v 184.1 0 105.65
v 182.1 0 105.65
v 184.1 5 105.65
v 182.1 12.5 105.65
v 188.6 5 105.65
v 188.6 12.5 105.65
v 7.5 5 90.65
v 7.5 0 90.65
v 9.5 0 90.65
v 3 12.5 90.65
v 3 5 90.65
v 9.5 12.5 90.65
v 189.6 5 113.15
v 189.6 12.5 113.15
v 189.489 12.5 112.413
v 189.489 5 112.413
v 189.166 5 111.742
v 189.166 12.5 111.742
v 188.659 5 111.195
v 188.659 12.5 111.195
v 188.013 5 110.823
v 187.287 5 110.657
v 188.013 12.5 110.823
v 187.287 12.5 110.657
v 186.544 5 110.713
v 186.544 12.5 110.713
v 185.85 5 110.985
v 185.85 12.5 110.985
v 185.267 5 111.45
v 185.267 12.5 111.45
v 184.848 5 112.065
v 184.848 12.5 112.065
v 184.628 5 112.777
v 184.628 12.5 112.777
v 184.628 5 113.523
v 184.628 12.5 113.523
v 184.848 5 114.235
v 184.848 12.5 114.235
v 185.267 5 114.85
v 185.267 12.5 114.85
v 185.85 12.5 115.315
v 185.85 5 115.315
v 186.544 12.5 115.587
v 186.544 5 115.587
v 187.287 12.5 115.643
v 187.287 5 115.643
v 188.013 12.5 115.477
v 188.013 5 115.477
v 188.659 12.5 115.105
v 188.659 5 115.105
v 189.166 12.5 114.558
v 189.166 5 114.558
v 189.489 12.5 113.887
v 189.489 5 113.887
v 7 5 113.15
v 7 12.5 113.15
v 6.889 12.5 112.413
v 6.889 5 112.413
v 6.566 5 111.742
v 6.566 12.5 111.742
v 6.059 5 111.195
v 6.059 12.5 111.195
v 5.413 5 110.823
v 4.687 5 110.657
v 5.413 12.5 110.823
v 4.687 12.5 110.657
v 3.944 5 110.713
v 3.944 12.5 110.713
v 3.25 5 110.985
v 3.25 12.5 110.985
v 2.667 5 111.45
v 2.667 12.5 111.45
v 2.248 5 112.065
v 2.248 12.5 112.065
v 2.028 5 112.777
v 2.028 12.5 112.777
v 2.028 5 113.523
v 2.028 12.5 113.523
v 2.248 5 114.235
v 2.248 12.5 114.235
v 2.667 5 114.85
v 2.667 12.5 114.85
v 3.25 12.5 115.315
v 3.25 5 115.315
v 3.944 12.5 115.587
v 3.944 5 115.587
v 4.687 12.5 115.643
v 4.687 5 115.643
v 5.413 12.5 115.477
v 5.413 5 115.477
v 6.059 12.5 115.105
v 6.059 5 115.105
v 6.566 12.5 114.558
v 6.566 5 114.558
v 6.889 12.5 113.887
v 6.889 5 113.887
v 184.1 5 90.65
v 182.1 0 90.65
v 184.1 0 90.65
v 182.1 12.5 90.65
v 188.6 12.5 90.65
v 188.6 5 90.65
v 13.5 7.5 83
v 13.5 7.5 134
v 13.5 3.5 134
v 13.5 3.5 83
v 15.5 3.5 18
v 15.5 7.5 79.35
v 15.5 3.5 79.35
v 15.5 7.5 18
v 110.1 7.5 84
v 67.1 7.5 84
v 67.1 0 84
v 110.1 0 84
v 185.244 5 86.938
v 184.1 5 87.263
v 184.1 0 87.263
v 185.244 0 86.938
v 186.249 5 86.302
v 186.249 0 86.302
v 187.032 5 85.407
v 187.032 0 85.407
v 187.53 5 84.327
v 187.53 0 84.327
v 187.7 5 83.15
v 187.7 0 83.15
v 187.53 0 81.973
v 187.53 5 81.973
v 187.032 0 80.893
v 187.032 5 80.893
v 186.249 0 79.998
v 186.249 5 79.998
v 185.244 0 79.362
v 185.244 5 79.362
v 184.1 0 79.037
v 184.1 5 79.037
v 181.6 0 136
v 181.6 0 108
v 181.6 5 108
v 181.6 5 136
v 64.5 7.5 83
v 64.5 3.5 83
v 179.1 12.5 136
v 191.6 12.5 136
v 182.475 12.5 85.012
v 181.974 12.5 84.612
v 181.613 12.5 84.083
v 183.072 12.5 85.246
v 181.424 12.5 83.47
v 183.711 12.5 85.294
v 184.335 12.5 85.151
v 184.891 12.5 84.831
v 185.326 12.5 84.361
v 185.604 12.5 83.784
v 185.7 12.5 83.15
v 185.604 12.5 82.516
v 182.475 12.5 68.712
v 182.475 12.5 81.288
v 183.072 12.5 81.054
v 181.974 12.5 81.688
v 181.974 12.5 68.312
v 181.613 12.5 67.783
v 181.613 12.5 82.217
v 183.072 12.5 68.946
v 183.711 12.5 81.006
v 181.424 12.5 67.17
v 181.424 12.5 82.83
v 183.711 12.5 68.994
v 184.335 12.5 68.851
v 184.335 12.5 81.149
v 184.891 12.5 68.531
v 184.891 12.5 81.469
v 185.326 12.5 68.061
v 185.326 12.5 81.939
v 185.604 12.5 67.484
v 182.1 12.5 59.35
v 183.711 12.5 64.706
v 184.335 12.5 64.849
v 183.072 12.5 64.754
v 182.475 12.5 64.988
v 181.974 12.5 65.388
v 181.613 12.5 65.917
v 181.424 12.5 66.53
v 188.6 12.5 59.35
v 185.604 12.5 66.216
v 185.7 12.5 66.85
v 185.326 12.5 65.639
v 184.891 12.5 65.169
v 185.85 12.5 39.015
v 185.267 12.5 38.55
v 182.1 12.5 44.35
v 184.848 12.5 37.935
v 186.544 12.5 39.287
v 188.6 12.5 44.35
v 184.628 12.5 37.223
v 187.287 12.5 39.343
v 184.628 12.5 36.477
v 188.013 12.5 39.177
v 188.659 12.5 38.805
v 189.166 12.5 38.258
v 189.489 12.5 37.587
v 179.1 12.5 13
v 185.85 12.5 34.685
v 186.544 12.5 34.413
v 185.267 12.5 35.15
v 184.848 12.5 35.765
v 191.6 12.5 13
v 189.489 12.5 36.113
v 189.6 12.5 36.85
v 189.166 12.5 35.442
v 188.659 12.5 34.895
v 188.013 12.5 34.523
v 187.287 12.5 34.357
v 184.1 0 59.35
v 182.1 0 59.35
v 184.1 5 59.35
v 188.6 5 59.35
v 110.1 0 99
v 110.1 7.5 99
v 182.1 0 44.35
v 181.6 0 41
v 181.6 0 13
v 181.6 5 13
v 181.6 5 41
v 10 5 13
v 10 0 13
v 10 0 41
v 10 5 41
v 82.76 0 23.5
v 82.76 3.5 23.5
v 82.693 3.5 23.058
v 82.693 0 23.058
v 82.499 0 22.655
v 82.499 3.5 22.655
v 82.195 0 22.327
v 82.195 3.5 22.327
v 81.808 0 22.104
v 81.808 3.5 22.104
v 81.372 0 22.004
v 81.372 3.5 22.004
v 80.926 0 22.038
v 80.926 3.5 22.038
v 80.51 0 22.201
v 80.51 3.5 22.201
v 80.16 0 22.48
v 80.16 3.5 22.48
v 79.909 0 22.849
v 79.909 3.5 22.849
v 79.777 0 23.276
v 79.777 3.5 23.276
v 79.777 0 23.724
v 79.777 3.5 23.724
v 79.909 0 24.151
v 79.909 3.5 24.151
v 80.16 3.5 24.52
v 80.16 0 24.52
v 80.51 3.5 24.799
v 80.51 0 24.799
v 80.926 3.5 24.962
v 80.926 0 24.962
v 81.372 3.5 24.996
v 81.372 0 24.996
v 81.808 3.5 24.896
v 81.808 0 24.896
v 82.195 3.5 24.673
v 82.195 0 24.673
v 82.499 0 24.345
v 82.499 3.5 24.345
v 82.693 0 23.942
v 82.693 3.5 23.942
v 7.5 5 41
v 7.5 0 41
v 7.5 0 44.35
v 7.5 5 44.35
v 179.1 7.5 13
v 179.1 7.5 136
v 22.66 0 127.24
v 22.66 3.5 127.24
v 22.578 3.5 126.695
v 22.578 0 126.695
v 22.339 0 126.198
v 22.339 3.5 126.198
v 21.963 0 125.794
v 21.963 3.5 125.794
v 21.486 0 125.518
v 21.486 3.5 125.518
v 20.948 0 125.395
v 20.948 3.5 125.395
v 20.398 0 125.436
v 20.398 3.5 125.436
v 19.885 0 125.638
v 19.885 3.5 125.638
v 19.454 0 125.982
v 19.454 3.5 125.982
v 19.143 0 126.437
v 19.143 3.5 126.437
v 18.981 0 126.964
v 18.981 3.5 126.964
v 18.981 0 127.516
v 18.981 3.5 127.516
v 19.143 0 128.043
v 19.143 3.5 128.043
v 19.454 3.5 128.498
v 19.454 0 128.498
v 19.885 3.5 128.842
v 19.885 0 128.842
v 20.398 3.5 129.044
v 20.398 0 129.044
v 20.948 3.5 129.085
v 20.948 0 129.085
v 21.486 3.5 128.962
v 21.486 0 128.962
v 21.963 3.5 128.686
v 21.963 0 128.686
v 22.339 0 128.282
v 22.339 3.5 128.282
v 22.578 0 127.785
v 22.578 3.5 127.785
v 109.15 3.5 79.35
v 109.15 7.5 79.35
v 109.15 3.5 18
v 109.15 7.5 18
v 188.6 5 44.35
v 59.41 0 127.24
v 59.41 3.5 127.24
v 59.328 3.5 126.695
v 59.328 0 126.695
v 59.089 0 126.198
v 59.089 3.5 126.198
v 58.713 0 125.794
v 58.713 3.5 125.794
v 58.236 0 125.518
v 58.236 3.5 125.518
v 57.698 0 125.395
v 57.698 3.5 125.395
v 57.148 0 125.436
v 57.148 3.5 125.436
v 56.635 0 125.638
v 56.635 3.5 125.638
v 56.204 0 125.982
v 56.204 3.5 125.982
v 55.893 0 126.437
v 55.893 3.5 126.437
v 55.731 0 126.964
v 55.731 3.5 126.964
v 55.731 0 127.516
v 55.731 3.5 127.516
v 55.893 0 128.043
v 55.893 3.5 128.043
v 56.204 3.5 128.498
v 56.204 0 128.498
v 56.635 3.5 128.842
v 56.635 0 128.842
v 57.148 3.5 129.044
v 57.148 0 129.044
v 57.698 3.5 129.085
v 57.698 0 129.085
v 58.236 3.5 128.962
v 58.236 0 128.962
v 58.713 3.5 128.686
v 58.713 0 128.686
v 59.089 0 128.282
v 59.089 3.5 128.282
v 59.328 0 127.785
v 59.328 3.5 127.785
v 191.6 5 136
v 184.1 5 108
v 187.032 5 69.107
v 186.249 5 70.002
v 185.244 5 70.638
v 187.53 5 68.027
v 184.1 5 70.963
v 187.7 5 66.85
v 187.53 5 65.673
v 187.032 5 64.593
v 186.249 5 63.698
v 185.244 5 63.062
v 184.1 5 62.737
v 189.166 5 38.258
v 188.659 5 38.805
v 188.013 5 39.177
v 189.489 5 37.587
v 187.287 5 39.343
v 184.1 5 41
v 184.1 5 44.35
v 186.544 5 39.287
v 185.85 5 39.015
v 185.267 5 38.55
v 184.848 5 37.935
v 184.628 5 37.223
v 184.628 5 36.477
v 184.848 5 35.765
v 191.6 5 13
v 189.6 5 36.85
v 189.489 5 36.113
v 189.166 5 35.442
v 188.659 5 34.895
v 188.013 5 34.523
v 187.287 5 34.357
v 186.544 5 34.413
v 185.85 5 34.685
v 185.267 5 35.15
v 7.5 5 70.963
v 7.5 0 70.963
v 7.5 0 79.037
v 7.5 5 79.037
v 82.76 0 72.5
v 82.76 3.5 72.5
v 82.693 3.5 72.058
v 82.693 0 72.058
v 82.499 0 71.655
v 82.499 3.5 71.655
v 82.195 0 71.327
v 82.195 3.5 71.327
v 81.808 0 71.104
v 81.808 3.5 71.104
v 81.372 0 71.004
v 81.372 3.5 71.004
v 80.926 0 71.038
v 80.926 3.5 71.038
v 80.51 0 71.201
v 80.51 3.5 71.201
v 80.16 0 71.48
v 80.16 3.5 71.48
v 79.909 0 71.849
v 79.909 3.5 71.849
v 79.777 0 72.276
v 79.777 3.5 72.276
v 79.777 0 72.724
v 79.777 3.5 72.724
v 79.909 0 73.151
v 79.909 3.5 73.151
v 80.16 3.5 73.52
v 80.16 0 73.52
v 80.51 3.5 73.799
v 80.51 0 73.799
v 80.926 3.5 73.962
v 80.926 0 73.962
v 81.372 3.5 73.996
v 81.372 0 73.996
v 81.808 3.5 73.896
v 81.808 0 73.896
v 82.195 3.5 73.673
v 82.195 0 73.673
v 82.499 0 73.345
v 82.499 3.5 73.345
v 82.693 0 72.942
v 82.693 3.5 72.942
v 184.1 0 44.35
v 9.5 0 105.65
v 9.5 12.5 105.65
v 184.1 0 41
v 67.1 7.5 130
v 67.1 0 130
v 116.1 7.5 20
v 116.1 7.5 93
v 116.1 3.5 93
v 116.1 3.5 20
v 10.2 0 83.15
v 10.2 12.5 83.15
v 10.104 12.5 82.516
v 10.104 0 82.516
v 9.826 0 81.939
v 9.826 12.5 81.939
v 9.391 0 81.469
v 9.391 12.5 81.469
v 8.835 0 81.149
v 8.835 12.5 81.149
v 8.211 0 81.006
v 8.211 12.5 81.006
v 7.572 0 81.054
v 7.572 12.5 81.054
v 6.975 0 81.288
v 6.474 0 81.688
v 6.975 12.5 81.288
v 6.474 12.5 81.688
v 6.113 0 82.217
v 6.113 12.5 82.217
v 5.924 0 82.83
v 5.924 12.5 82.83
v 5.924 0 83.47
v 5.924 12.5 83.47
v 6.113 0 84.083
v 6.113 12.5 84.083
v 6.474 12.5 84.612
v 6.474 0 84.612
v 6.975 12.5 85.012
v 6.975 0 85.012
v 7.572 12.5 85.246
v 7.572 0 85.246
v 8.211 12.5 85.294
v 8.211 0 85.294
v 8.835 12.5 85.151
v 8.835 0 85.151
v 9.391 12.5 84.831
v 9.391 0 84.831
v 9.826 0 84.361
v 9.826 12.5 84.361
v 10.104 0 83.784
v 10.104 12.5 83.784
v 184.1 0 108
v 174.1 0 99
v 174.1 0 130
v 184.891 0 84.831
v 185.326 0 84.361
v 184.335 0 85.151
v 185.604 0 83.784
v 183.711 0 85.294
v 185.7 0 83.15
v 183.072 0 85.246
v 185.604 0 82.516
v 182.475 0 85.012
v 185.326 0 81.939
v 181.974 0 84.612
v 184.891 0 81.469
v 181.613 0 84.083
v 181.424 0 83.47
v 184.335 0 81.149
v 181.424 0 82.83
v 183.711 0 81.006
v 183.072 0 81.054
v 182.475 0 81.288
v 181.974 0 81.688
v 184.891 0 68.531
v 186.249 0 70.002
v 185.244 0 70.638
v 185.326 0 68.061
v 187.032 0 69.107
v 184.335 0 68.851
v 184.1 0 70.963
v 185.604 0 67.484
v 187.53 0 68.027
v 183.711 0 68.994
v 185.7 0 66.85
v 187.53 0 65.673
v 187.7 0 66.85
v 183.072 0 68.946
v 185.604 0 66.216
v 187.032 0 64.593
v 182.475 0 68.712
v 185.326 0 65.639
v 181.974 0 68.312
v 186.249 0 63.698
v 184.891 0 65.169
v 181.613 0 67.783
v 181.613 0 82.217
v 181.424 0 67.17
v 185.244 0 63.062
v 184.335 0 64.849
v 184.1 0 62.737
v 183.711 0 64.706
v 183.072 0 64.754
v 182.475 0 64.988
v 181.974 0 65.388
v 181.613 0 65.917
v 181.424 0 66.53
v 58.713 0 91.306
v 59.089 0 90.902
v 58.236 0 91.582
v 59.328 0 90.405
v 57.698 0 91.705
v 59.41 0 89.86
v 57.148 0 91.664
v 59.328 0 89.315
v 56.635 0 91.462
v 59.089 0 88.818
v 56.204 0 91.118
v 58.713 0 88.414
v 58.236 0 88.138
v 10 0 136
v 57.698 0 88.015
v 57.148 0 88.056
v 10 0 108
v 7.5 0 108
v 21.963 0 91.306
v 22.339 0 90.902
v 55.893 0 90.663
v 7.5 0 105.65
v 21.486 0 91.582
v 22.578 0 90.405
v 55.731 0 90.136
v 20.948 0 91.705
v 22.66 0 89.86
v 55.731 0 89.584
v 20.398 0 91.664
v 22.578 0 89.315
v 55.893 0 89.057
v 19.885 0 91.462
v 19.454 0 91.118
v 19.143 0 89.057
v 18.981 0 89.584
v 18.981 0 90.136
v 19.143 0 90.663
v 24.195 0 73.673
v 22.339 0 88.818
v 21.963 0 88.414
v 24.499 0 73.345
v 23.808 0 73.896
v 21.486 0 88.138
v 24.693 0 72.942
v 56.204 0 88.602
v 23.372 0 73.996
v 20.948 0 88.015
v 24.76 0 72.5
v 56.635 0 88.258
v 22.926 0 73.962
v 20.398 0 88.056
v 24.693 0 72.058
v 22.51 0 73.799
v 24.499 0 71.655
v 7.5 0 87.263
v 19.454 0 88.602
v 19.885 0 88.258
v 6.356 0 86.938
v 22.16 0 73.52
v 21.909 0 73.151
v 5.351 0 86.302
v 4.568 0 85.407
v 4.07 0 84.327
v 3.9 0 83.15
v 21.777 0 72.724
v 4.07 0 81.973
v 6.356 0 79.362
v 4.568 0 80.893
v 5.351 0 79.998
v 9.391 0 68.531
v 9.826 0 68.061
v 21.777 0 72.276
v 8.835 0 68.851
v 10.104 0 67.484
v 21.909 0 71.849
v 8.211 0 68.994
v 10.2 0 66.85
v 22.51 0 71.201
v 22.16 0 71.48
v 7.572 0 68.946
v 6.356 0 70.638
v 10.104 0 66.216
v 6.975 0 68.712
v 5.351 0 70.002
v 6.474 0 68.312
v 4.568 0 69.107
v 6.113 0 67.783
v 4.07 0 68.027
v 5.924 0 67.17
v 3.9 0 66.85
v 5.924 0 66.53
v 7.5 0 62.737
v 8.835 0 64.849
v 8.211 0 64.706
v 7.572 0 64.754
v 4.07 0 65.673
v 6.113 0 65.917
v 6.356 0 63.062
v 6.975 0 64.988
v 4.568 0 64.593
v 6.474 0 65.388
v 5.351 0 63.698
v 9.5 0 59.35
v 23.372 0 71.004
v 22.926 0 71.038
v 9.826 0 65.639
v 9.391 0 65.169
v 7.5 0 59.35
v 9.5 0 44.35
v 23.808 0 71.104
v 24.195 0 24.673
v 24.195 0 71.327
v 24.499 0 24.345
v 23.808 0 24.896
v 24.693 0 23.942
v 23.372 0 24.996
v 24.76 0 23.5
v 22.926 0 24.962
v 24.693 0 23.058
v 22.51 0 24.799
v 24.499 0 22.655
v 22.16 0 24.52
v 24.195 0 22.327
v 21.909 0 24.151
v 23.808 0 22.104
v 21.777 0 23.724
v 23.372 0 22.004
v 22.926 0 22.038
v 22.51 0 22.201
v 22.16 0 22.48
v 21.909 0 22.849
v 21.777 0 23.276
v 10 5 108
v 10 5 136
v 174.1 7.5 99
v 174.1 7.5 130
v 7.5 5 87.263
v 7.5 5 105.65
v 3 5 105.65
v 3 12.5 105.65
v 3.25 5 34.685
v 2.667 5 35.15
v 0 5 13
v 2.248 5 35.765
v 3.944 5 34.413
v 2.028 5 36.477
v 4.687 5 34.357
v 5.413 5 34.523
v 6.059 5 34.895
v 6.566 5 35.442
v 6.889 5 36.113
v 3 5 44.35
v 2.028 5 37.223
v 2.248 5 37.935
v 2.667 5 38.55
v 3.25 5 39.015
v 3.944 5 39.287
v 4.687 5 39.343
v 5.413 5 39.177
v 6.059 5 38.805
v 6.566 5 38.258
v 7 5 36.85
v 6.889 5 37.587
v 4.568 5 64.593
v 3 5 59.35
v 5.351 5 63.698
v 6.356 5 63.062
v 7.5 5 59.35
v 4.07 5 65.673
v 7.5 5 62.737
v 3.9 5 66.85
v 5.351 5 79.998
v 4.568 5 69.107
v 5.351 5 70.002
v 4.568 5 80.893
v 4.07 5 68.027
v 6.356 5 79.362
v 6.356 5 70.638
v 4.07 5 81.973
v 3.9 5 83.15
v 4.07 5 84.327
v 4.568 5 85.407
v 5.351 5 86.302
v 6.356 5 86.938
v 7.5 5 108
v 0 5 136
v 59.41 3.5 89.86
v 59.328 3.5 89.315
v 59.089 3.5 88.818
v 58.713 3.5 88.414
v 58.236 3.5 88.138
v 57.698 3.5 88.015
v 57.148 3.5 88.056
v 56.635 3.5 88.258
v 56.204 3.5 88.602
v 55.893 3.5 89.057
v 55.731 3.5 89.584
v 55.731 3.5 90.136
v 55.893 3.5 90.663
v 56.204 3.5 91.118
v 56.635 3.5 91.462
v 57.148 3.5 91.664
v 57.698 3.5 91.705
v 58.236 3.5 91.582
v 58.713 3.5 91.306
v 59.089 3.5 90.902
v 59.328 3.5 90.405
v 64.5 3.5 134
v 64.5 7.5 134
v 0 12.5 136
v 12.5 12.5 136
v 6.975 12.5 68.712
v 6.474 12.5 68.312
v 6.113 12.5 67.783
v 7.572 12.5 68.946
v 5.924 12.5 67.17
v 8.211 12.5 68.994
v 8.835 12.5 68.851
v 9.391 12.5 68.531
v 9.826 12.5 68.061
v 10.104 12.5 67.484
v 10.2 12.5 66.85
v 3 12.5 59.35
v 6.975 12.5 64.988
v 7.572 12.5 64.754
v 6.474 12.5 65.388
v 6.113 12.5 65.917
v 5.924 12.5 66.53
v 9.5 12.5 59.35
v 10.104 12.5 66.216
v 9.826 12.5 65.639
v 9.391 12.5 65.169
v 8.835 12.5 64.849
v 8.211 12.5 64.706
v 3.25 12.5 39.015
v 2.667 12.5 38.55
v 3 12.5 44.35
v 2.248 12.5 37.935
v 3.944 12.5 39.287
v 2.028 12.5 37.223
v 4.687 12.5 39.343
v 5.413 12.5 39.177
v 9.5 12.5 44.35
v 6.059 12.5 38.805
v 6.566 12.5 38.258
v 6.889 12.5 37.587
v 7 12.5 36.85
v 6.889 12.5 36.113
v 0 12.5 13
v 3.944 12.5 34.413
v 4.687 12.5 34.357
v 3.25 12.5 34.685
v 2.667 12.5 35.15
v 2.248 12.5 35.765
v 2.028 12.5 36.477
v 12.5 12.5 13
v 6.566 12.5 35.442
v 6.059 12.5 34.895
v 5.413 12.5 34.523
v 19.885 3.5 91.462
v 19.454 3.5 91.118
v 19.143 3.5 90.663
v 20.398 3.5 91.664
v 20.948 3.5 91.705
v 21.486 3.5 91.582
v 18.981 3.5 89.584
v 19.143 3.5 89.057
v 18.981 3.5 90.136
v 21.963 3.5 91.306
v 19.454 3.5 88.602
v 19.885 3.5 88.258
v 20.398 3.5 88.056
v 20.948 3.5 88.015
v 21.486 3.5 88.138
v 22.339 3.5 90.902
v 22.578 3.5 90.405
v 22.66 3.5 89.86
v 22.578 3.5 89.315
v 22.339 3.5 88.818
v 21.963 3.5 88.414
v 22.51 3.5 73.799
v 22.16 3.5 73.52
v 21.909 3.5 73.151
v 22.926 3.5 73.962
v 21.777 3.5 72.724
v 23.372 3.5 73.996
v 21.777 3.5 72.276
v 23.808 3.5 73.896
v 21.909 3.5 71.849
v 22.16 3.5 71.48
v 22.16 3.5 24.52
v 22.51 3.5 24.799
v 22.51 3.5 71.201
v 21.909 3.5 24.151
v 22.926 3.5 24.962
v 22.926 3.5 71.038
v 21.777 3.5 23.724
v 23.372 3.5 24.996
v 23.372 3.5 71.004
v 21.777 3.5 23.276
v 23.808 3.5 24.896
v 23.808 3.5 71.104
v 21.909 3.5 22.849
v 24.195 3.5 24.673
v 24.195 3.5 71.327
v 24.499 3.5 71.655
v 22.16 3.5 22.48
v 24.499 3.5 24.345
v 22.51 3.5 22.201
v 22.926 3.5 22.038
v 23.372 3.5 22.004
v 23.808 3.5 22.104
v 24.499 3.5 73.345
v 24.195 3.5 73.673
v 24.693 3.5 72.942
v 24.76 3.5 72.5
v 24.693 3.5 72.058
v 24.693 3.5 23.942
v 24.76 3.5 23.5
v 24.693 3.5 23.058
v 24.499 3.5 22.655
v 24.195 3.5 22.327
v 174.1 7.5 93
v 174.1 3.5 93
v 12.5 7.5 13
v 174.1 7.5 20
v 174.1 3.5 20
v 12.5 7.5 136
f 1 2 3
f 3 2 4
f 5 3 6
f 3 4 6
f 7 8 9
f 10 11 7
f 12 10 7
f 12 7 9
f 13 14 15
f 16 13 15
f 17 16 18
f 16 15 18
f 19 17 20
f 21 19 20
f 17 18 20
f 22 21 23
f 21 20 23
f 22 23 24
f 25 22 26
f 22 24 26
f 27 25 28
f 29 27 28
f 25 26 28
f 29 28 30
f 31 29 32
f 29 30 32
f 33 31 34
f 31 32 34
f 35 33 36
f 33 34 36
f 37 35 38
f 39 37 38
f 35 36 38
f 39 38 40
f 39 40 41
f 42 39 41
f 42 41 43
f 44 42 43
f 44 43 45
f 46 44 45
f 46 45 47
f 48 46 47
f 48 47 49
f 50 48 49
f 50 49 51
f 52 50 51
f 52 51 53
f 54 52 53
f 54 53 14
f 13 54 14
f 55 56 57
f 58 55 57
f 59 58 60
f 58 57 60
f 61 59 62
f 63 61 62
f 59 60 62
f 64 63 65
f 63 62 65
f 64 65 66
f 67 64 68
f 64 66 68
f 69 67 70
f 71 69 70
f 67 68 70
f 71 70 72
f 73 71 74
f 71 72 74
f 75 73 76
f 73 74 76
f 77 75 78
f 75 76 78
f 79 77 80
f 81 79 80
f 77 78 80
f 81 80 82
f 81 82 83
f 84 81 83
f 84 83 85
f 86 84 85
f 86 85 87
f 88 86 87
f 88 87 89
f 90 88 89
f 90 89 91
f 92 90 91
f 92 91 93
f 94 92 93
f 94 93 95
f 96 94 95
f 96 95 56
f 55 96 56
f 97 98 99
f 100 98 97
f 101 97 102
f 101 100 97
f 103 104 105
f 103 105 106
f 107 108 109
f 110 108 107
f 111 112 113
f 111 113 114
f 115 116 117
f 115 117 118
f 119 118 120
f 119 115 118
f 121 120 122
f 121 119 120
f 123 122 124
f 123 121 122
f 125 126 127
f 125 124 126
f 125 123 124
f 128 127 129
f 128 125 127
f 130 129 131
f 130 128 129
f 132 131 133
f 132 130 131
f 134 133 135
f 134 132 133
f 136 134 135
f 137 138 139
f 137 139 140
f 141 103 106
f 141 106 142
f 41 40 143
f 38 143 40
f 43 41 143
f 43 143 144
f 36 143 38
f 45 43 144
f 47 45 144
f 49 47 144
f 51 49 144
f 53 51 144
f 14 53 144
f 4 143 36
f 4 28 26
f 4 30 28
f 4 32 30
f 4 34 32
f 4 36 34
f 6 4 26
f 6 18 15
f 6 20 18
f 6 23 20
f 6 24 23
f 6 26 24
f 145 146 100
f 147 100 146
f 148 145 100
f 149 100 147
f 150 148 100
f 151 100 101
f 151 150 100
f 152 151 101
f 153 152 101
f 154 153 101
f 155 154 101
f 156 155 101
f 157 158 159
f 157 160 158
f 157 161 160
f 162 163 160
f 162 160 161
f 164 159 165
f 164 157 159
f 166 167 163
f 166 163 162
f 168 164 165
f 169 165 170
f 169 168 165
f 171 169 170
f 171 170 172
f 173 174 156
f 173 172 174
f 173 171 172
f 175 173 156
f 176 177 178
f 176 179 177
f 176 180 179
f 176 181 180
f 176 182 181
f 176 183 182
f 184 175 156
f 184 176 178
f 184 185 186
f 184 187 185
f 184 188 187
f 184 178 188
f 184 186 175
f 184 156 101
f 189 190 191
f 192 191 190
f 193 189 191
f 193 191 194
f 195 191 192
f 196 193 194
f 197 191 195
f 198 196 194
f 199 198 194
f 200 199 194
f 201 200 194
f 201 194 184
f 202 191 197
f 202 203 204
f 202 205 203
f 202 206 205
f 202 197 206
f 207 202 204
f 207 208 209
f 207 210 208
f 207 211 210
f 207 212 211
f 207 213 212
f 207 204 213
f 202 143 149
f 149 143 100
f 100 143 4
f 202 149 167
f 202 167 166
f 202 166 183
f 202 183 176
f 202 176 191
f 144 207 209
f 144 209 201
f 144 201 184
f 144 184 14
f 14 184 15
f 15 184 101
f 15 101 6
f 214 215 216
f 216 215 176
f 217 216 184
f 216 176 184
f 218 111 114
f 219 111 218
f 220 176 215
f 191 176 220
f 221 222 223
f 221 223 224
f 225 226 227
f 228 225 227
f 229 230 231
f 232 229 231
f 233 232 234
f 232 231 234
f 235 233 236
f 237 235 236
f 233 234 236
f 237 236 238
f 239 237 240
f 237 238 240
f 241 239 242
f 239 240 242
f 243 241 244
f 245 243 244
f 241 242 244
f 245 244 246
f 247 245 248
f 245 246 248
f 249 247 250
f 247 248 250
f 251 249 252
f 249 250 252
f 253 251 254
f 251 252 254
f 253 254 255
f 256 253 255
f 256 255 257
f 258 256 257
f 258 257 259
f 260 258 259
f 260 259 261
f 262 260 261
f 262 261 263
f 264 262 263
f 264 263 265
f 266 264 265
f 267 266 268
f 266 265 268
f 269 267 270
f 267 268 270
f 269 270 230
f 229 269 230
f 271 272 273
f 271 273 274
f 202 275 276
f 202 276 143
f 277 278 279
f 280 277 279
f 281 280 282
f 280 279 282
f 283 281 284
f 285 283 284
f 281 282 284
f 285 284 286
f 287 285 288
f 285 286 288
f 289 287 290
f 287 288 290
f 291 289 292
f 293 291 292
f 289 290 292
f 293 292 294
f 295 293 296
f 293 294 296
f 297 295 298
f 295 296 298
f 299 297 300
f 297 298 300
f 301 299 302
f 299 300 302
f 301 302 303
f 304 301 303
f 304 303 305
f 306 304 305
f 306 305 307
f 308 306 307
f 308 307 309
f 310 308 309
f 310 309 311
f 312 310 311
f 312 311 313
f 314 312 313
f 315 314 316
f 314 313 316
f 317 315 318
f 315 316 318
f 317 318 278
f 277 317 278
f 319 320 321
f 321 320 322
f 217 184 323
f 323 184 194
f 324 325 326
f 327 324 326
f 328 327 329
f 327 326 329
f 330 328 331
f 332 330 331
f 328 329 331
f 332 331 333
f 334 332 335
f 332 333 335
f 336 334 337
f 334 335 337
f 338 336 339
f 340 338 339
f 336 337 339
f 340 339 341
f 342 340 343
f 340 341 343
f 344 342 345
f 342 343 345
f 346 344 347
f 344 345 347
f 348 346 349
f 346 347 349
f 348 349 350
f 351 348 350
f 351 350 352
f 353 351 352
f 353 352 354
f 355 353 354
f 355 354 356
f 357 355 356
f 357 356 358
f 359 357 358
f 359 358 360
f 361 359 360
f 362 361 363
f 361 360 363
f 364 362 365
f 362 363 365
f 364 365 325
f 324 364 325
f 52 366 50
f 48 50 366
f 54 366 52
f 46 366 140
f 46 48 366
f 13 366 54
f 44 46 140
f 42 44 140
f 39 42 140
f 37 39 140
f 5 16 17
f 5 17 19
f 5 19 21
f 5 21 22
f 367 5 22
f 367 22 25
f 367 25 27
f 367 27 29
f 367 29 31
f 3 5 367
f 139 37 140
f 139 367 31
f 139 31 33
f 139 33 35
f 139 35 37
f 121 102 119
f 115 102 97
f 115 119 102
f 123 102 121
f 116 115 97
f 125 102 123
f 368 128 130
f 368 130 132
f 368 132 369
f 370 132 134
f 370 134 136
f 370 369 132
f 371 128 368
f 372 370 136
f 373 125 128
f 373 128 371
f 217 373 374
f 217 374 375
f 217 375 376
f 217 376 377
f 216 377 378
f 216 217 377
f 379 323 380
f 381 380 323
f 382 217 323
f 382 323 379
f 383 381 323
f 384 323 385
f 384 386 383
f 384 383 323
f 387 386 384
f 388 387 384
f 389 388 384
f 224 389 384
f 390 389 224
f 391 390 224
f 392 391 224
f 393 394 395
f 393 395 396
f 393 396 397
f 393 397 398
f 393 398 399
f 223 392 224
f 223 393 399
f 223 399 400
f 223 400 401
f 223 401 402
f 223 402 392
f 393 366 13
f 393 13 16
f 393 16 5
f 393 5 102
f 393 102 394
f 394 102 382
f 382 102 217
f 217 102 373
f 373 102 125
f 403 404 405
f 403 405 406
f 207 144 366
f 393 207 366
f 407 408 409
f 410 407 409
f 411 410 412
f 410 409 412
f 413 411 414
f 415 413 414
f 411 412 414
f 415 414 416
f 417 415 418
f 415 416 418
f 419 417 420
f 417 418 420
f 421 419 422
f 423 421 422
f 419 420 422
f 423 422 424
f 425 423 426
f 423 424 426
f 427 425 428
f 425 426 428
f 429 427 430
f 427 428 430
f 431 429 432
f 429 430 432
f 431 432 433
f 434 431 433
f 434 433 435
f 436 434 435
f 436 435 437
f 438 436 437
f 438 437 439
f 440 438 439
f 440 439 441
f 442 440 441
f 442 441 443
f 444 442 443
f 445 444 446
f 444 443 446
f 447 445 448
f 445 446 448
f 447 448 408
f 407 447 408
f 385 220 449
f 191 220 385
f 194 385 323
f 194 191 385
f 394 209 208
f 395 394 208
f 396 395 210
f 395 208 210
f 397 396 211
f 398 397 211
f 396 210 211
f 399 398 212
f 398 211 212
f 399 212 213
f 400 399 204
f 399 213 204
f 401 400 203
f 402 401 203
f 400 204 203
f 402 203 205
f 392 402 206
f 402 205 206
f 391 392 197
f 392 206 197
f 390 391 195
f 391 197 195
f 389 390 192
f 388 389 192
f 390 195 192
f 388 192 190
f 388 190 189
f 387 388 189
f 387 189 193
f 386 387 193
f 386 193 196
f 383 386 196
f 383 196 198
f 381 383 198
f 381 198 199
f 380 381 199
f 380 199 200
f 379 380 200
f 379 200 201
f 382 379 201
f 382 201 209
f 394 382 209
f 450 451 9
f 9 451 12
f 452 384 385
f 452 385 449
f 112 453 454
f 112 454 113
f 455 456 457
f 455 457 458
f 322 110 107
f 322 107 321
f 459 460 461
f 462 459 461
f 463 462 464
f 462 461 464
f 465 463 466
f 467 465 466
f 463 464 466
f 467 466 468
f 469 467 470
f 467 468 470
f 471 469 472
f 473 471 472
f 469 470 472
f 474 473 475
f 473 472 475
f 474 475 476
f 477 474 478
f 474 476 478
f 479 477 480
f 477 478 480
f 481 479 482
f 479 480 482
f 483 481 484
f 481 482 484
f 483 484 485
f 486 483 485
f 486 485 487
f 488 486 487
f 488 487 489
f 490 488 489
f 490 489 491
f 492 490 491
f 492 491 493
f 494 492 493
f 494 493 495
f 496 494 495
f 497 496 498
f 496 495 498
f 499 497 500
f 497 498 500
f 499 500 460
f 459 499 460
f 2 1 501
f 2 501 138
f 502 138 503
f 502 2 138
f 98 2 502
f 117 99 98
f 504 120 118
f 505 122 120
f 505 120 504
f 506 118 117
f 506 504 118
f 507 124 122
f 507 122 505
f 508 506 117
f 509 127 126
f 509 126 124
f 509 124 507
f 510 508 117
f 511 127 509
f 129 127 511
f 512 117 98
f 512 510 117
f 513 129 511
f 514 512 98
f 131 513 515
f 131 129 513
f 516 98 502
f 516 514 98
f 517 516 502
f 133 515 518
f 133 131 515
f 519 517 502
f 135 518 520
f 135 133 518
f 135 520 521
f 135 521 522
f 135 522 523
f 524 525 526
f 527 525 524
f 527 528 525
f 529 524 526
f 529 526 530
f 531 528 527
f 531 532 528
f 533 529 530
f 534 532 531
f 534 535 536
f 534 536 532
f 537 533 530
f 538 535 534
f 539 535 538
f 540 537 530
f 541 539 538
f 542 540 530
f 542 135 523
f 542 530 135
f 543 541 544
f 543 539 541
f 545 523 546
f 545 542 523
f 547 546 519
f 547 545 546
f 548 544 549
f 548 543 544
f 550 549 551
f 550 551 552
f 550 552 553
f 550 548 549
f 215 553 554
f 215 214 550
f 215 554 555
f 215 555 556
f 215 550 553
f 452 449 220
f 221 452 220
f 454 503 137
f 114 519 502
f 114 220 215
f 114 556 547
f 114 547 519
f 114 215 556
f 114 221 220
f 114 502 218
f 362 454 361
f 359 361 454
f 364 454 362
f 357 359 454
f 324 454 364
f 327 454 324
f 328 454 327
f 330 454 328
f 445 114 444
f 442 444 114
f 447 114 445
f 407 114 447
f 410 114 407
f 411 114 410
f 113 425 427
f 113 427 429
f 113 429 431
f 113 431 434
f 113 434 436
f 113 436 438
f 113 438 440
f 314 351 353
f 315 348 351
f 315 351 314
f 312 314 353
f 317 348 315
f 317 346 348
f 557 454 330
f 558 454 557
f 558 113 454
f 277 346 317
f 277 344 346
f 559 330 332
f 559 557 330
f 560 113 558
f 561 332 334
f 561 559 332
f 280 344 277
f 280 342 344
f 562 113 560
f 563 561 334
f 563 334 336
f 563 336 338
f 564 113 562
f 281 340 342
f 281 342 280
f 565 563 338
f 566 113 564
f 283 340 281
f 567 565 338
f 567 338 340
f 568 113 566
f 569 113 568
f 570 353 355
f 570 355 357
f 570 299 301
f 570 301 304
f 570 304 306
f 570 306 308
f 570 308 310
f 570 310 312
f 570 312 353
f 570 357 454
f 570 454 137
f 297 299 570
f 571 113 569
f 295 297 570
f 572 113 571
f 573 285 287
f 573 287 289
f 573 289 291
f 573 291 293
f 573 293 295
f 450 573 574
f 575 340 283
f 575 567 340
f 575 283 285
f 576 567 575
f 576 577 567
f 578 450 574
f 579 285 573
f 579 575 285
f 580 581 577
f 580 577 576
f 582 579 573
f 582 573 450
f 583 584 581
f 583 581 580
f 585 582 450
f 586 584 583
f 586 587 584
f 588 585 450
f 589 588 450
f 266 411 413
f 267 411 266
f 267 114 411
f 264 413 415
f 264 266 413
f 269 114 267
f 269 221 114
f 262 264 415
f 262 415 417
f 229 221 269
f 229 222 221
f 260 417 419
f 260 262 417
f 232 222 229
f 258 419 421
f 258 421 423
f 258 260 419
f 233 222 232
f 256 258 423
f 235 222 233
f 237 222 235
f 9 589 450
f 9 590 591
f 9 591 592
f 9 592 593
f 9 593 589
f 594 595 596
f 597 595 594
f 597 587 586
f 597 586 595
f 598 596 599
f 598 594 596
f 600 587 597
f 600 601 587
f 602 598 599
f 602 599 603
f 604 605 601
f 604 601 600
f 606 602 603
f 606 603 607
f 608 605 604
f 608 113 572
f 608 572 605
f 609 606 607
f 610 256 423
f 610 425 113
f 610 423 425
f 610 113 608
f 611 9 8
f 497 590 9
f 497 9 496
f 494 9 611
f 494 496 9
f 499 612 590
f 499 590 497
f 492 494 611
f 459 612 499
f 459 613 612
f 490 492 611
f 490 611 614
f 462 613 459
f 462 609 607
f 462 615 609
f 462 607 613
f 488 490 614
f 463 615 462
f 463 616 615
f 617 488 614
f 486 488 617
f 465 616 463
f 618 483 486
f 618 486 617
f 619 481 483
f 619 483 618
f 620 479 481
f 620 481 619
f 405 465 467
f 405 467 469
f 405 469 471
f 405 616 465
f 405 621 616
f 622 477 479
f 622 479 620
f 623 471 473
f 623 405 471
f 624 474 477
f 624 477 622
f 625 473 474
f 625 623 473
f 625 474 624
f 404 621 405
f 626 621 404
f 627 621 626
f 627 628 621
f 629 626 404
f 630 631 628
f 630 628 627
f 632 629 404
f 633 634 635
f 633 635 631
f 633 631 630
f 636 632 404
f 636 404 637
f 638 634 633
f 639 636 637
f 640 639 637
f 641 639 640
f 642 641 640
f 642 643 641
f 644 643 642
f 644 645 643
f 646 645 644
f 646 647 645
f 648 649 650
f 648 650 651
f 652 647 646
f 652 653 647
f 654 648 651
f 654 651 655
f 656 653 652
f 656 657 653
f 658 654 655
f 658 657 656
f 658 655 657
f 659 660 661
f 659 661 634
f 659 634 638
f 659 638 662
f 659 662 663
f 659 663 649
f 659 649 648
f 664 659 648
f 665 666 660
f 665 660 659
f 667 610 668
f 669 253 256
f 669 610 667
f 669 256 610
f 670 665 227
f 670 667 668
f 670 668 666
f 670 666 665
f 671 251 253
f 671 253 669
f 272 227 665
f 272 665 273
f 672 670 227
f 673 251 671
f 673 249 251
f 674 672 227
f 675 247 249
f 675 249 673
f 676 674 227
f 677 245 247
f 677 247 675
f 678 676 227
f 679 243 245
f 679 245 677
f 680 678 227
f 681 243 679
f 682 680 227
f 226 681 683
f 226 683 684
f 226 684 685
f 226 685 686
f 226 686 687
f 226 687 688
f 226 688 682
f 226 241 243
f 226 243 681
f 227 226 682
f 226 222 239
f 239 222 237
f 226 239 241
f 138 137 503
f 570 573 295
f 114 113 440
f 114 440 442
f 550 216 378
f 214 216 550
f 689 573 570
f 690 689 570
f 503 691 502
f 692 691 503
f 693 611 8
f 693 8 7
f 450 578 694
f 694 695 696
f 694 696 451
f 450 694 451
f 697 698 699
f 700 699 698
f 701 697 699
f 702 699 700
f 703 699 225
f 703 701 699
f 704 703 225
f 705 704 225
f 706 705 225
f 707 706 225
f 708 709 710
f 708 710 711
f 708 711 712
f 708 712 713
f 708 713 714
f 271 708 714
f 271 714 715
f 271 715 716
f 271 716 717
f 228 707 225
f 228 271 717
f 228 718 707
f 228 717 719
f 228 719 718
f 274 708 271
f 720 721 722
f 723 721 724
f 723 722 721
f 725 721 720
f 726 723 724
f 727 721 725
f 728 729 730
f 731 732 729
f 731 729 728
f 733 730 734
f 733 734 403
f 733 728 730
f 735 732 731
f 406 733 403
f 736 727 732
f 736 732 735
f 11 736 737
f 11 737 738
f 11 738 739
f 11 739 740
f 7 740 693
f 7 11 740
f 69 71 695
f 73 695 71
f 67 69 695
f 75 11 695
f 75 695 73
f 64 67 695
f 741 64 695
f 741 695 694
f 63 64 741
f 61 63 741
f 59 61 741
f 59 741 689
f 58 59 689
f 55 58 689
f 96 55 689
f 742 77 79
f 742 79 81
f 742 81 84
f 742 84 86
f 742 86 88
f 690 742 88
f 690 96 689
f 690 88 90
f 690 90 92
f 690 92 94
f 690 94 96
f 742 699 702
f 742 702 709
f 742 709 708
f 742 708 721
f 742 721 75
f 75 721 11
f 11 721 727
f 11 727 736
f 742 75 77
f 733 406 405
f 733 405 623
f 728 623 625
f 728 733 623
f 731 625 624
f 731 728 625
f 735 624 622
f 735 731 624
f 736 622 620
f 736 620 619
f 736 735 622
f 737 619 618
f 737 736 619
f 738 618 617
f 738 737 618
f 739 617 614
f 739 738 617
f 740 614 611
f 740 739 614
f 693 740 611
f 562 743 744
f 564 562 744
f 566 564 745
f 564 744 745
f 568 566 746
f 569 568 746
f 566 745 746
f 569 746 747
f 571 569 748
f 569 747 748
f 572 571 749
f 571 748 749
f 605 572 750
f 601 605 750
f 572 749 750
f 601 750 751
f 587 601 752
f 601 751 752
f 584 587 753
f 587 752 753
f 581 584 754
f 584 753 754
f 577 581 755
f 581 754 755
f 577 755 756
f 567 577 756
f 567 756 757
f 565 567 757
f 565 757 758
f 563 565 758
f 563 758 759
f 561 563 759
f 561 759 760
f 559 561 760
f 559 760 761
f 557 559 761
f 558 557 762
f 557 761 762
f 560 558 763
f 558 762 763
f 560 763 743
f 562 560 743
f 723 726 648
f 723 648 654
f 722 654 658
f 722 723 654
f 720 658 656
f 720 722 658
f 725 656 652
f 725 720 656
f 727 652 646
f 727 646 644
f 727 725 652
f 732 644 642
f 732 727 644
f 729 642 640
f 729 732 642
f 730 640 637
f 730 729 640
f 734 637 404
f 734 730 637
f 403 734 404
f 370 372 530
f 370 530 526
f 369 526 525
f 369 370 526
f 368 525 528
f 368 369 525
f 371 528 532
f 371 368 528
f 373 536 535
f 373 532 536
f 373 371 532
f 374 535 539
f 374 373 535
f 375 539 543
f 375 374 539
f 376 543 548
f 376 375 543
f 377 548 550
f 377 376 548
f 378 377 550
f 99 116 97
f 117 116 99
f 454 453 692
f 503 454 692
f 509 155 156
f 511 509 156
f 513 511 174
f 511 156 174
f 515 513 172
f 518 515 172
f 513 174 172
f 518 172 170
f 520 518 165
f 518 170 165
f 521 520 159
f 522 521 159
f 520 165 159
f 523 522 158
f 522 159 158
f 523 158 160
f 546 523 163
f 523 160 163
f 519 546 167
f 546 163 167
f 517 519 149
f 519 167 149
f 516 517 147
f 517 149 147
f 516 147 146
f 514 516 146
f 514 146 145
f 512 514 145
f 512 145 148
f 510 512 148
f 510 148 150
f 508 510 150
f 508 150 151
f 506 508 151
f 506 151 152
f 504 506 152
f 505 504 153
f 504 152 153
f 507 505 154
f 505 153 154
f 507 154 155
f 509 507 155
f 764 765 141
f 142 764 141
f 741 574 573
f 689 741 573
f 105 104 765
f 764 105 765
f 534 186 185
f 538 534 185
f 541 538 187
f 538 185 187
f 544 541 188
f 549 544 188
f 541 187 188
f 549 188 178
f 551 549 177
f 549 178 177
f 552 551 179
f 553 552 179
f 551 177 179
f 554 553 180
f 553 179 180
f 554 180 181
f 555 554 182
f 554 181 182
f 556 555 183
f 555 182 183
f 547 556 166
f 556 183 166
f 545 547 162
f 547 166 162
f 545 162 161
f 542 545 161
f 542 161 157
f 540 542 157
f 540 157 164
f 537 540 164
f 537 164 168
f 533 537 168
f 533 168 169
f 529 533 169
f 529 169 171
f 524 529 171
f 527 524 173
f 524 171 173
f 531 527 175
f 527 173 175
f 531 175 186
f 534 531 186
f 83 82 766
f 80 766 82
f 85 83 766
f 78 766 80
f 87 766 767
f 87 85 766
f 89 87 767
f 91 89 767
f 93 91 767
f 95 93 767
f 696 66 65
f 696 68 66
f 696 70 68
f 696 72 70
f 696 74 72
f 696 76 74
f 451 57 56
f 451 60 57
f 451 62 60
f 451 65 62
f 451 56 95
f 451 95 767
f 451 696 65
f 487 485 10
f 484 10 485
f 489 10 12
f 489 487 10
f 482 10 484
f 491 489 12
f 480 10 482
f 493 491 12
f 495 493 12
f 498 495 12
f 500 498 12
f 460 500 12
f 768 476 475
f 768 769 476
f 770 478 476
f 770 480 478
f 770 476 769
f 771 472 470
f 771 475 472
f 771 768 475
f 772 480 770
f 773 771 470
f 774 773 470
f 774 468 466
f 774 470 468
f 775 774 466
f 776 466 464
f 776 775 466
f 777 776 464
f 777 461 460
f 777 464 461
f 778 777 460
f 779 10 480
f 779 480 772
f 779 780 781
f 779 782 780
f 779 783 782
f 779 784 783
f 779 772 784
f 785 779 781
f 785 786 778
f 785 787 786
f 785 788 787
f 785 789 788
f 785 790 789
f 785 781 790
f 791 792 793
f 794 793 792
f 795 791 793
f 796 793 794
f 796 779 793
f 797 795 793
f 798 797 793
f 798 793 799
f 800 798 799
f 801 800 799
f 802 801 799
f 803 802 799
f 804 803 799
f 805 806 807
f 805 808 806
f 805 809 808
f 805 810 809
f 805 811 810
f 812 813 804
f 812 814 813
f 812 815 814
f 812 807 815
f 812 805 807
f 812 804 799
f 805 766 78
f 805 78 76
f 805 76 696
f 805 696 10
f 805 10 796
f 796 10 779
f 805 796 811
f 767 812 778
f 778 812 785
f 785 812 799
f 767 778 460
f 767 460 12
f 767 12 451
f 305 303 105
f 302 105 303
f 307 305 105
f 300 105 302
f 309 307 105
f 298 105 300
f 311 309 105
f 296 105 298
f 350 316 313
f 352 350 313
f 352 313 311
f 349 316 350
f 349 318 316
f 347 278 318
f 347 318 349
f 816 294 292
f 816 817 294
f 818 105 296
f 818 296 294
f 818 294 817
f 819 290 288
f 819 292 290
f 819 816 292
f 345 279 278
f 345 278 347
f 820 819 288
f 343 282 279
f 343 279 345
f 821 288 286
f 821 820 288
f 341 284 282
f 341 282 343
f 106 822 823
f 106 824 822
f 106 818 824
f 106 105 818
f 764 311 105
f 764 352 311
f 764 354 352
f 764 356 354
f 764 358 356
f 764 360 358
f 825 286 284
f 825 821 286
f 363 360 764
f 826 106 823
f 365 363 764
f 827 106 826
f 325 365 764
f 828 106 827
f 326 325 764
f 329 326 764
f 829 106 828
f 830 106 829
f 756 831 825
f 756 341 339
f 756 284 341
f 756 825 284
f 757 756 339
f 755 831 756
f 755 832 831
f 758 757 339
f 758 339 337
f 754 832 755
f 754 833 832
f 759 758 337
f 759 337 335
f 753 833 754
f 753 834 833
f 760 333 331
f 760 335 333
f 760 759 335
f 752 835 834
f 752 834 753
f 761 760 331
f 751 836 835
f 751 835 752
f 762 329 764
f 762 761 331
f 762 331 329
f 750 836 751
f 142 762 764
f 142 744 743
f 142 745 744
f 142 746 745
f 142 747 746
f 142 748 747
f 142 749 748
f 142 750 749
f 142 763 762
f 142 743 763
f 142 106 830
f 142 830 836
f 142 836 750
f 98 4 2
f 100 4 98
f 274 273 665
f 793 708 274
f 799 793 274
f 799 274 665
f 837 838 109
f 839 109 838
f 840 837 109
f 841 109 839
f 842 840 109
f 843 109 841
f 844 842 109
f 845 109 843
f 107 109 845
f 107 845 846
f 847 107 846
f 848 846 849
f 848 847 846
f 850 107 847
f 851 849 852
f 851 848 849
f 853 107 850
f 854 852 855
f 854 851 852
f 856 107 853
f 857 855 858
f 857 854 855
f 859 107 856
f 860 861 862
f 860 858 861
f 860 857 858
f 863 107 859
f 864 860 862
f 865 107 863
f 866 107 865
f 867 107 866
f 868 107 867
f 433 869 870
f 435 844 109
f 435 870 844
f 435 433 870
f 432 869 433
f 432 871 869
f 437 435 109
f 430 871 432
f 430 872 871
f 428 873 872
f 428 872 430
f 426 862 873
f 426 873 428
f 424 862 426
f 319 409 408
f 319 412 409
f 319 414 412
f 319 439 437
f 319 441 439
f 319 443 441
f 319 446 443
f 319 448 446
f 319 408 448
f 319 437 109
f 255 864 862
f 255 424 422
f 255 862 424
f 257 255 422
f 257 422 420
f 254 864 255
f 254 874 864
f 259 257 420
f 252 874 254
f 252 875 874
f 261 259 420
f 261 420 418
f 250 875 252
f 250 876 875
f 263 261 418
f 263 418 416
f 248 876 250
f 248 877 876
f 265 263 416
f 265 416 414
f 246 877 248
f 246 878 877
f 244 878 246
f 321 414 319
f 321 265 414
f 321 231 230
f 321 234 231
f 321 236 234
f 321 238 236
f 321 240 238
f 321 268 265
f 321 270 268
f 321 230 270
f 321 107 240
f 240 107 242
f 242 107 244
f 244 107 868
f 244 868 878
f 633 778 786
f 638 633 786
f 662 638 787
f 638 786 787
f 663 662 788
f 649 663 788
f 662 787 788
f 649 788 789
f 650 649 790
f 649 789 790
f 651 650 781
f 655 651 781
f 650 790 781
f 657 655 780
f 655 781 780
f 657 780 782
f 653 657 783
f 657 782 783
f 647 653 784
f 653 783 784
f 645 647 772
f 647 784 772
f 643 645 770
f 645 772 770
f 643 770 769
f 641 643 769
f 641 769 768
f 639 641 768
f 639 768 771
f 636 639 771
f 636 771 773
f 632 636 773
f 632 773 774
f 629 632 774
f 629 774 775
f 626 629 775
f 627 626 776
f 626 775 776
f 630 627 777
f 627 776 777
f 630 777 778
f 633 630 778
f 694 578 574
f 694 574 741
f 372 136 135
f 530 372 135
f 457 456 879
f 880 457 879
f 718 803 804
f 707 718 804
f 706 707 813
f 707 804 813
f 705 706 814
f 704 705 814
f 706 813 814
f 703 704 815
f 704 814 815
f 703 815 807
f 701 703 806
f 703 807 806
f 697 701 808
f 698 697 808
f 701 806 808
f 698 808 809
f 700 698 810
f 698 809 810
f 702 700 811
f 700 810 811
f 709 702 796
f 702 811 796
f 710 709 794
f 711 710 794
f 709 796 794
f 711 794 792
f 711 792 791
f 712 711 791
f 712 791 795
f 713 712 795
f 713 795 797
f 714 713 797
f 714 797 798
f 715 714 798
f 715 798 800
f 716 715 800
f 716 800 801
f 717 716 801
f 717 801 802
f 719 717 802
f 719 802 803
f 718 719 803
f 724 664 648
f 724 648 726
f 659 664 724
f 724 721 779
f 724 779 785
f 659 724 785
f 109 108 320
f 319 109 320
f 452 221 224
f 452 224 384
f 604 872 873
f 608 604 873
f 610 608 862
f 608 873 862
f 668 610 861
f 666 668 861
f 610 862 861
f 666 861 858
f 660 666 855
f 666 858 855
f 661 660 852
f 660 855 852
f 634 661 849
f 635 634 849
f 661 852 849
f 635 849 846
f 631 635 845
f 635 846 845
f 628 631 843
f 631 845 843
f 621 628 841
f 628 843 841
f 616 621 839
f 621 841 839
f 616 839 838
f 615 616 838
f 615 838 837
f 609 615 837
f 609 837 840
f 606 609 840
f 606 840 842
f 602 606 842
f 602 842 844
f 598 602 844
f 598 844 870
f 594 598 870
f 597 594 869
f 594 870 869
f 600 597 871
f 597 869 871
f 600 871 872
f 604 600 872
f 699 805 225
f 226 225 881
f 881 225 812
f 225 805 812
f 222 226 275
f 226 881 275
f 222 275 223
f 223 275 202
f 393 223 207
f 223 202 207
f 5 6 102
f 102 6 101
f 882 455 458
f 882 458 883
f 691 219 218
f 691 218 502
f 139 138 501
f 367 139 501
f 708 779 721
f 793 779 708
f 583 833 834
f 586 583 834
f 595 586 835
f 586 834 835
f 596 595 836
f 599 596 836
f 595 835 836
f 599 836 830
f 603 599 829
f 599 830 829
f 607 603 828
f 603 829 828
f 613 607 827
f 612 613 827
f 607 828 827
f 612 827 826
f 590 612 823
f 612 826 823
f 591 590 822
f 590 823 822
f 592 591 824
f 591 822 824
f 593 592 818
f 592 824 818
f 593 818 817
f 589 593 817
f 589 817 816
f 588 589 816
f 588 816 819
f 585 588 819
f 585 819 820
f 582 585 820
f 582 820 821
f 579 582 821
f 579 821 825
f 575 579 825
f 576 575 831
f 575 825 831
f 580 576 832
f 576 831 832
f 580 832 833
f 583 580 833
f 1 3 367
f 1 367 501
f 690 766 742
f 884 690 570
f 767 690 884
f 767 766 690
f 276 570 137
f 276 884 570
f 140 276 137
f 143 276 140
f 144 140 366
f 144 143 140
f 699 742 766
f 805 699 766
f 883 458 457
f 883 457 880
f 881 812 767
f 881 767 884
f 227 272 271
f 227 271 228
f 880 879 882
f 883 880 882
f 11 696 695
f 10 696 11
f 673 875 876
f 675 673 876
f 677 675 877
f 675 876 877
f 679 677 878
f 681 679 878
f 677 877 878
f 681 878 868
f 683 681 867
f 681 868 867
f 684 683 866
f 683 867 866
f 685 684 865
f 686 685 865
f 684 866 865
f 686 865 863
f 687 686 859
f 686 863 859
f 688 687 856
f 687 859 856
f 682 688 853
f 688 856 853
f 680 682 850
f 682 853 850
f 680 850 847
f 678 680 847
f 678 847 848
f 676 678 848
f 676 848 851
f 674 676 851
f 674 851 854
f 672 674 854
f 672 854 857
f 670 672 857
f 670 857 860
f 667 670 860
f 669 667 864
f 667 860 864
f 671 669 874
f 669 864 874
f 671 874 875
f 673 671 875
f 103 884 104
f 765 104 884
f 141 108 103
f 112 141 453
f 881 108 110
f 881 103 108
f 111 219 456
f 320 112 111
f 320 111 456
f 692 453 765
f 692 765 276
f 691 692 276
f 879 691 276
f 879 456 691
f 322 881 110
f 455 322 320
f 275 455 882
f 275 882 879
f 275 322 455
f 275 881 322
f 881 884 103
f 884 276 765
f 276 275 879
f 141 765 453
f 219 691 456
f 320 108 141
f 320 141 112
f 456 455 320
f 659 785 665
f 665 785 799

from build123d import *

# Parameters (mm, degrees)
PLATEFRAME_DEPTH          = 150
SKETCH3_R                 = 2.5
HOLESUPPORT_DEPTH         = 13.5
SKETCH4_R                 = 4.15
SKETCH4_R_2               = 2.15
CYLINDRICALSUPPORTS_DEPTH = 12.5
SKETCH5_W                 = 43
SKETCH5_H                 = 43
SKETCH5_W_2               = 89.65
SKETCH5_H_2               = 57.35
SKETCH5_W_3               = 58
SKETCH5_H_3               = 73
ITEMLAYOUT_DEPTH          = 4
HOLECUTOUT_DEPTH          = 7.5
SKETCH7_R                 = 1.5
HOLERASPBERRYPI_DEPTH     = 3.5
SKETCH8_R                 = 1.85
HOLEMOTORDRIVER_DEPTH     = 3.5
SKETCH10_W                = 45
SKETCH10_H                = 45
SKETCH10_W_2              = 43
SKETCH10_H_2              = 43
CUTMOTORDRIVER_DEPTH      = 4
SKETCH11_W                = 93.65
SKETCH11_H                = 61.35
SKETCH11_W_2              = 89.65
SKETCH11_H_2              = 57.35
CUTPASPBERRYPI_DEPTH      = 4
SKETCH12_W                = 191.6
SKETCH12_H                = 13
SKETCH12_H_2              = 14
CUTPLATEEDGES_DEPTH       = 12.5
SKETCH13_W                = 6.5
SKETCH13_H                = 15
CUTSHELLHOLES_DEPTH       = 12.5
SKETCH14_W                = 51
SKETCH14_H                = 51
CUTMOTORDRIVER2_DEPTH     = 4
SKETCH15_R                = 2.5
STANDOFFHOLES_DEPTH       = 13.5
SKETCH16_W                = 2.5
SKETCH16_H                = 28
CUT_EXTRUDE1_DEPTH        = 5


with BuildPart() as part:
    # Sketch2 → PlateFrame (new body)
    with BuildSketch(Plane.XY):
        Polygon((179.1, 12.5), (191.6, 12.5), (191.6, 5), (184.1, 5), (184.1, 0), (7.5, 0), (7.5, 5), (0, 5), (0, 12.5), (12.5, 12.5), (12.5, 7.5), (179.1, 7.5), align=None)
    extrude(amount=PLATEFRAME_DEPTH)

    # Sketch3 → HoleSupport (cut, through all)
    with BuildSketch(Plane(origin=(0, 12.5, 0), x_dir=(1, 0, 0), z_dir=(0, 1, 0))):
        with Locations((8.05, -66.85)):
            Circle(SKETCH3_R)
        with Locations((8.05, -83.15)):
            Circle(SKETCH3_R)
        with Locations((183.55, -66.85)):
            Circle(SKETCH3_R)
        with Locations((183.55, -83.15)):
            Circle(SKETCH3_R)
    extrude(amount=-HOLESUPPORT_DEPTH, mode=Mode.SUBTRACT)

    # Sketch4 → CylindricalSupports (add)
    with BuildSketch(Plane(origin=(0, 12.5, 0), x_dir=(1, 0, 0), z_dir=(0, 1, 0))):
        with Locations((183.55, -66.85)):
            Circle(SKETCH4_R)
        with Locations((183.55, -66.85)):
            Circle(SKETCH4_R_2, mode=Mode.SUBTRACT)
        with Locations((183.55, -83.15)):
            Circle(SKETCH4_R)
        with Locations((183.55, -83.15)):
            Circle(SKETCH4_R_2, mode=Mode.SUBTRACT)
        with Locations((8.05, -66.85)):
            Circle(SKETCH4_R)
        with Locations((8.05, -66.85)):
            Circle(SKETCH4_R_2, mode=Mode.SUBTRACT)
        with Locations((8.05, -83.15)):
            Circle(SKETCH4_R)
        with Locations((8.05, -83.15)):
            Circle(SKETCH4_R_2, mode=Mode.SUBTRACT)
    extrude(amount=-CYLINDRICALSUPPORTS_DEPTH)

    # Sketch5 → ItemLayout (cut)
    with BuildSketch(Plane(origin=(0, 7.5, 0), x_dir=(1, 0, 0), z_dir=(0, 1, 0))):
        with Locations((39, -108.5)):
            Rectangle(SKETCH5_W, SKETCH5_H)
        with Locations((62.325, -48.675)):
            Rectangle(SKETCH5_W_2, SKETCH5_H_2)
        with Locations((145.1, -56.5)):
            Rectangle(SKETCH5_W_3, SKETCH5_H_3)
    extrude(amount=-ITEMLAYOUT_DEPTH, mode=Mode.SUBTRACT)

    # Sketch6 → HoleCutout (cut)
    with BuildSketch(Plane(origin=(0, 7.5, 0), x_dir=(1, 0, 0), z_dir=(0, 1, 0))):
        Polygon((67.1, -84), (110.1, -84), (110.1, -99), (174.1, -99), (174.1, -130), (110.1, -130), (67.1, -130), align=None)
    extrude(amount=-HOLECUTOUT_DEPTH, mode=Mode.SUBTRACT)

    # Sketch7 → HoleRaspberryPi (cut)
    with BuildSketch(Plane(origin=(0, 3.5, 0), x_dir=(1, 0, 0), z_dir=(0, 1, 0))):
        with Locations((23.26, -23.5)):
            Circle(SKETCH7_R)
        with Locations((23.26, -72.5)):
            Circle(SKETCH7_R)
        with Locations((81.26, -72.5)):
            Circle(SKETCH7_R)
        with Locations((81.26, -23.5)):
            Circle(SKETCH7_R)
    extrude(amount=-HOLERASPBERRYPI_DEPTH, mode=Mode.SUBTRACT)

    # Sketch8 → HoleMotorDriver (cut)
    with BuildSketch(Plane(origin=(0, 3.5, 0), x_dir=(1, 0, 0), z_dir=(0, 1, 0))):
        with Locations((57.56, -127.24)):
            Circle(SKETCH8_R)
        with Locations((57.56, -89.86)):
            Circle(SKETCH8_R)
        with Locations((20.81, -89.86)):
            Circle(SKETCH8_R)
        with Locations((20.81, -127.24)):
            Circle(SKETCH8_R)
    extrude(amount=-HOLEMOTORDRIVER_DEPTH, mode=Mode.SUBTRACT)

    # Sketch10 → CutMotorDriver (cut)
    with BuildSketch(Plane(origin=(0, 7.5, 0), x_dir=(1, 0, 0), z_dir=(0, 1, 0))):
        with Locations((39, -108.5)):
            Rectangle(SKETCH10_W, SKETCH10_H)
        with Locations((39, -108.5)):
            Rectangle(SKETCH10_W_2, SKETCH10_H_2, mode=Mode.SUBTRACT)
    extrude(amount=-CUTMOTORDRIVER_DEPTH, mode=Mode.SUBTRACT)

    # Sketch11 → CutPaspberryPi (cut)
    with BuildSketch(Plane(origin=(0, 7.5, 0), x_dir=(1, 0, 0), z_dir=(0, 1, 0))):
        with Locations((62.325, -48.675)):
            Rectangle(SKETCH11_W, SKETCH11_H)
        with Locations((62.325, -48.675)):
            Rectangle(SKETCH11_W_2, SKETCH11_H_2, mode=Mode.SUBTRACT)
    extrude(amount=-CUTPASPBERRYPI_DEPTH, mode=Mode.SUBTRACT)

    # Sketch12 → CutPlateEdges (cut)
    with BuildSketch(Plane(origin=(0, 12.5, 0), x_dir=(1, 0, 0), z_dir=(0, 1, 0))):
        with Locations((95.8, -6.5)):
            Rectangle(SKETCH12_W, SKETCH12_H)
        with Locations((95.8, -143)):
            Rectangle(SKETCH12_W, SKETCH12_H_2)
    extrude(amount=-CUTPLATEEDGES_DEPTH, mode=Mode.SUBTRACT)

    # Sketch13 → CutShellHoles (cut)
    with BuildSketch(Plane(origin=(0, 12.5, 0), x_dir=(1, 0, 0), z_dir=(0, 1, 0))):
        with Locations((6.25, -51.85)):
            Rectangle(SKETCH13_W, SKETCH13_H)
        with Locations((6.25, -98.15)):
            Rectangle(SKETCH13_W, SKETCH13_H)
        with Locations((185.35, -51.85)):
            Rectangle(SKETCH13_W, SKETCH13_H)
        with Locations((185.35, -98.15)):
            Rectangle(SKETCH13_W, SKETCH13_H)
    extrude(amount=-CUTSHELLHOLES_DEPTH, mode=Mode.SUBTRACT)

    # Sketch14 → CutMotorDriver2 (cut)
    with BuildSketch(Plane(origin=(0, 7.5, 0), x_dir=(1, 0, 0), z_dir=(0, 1, 0))):
        with Locations((39, -108.5)):
            Rectangle(SKETCH14_W, SKETCH14_H)
    extrude(amount=-CUTMOTORDRIVER2_DEPTH, mode=Mode.SUBTRACT)

    # Sketch15 → StandoffHoles (cut, through all)
    with BuildSketch(Plane(origin=(0, 12.5, 0), x_dir=(1, 0, 0), z_dir=(0, 1, 0))):
        with Locations((4.5, -36.85)):
            Circle(SKETCH15_R)
        with Locations((4.5, -113.15)):
            Circle(SKETCH15_R)
        with Locations((187.1, -113.15)):
            Circle(SKETCH15_R)
        with Locations((187.1, -36.85)):
            Circle(SKETCH15_R)
    extrude(amount=-STANDOFFHOLES_DEPTH, mode=Mode.SUBTRACT)

    # Sketch16 → Cut-Extrude1 (cut)
    with BuildSketch(Plane.XZ):
        with Locations((8.75, 122)):
            Rectangle(SKETCH16_W, SKETCH16_H)
        with Locations((182.85, 122)):
            Rectangle(SKETCH16_W, SKETCH16_H)
        with Locations((182.85, 27)):
            Rectangle(SKETCH16_W, SKETCH16_H)
        with Locations((8.75, 27)):
            Rectangle(SKETCH16_W, SKETCH16_H)
    extrude(amount=-CUT_EXTRUDE1_DEPTH, mode=Mode.SUBTRACT)


solid = part.part
